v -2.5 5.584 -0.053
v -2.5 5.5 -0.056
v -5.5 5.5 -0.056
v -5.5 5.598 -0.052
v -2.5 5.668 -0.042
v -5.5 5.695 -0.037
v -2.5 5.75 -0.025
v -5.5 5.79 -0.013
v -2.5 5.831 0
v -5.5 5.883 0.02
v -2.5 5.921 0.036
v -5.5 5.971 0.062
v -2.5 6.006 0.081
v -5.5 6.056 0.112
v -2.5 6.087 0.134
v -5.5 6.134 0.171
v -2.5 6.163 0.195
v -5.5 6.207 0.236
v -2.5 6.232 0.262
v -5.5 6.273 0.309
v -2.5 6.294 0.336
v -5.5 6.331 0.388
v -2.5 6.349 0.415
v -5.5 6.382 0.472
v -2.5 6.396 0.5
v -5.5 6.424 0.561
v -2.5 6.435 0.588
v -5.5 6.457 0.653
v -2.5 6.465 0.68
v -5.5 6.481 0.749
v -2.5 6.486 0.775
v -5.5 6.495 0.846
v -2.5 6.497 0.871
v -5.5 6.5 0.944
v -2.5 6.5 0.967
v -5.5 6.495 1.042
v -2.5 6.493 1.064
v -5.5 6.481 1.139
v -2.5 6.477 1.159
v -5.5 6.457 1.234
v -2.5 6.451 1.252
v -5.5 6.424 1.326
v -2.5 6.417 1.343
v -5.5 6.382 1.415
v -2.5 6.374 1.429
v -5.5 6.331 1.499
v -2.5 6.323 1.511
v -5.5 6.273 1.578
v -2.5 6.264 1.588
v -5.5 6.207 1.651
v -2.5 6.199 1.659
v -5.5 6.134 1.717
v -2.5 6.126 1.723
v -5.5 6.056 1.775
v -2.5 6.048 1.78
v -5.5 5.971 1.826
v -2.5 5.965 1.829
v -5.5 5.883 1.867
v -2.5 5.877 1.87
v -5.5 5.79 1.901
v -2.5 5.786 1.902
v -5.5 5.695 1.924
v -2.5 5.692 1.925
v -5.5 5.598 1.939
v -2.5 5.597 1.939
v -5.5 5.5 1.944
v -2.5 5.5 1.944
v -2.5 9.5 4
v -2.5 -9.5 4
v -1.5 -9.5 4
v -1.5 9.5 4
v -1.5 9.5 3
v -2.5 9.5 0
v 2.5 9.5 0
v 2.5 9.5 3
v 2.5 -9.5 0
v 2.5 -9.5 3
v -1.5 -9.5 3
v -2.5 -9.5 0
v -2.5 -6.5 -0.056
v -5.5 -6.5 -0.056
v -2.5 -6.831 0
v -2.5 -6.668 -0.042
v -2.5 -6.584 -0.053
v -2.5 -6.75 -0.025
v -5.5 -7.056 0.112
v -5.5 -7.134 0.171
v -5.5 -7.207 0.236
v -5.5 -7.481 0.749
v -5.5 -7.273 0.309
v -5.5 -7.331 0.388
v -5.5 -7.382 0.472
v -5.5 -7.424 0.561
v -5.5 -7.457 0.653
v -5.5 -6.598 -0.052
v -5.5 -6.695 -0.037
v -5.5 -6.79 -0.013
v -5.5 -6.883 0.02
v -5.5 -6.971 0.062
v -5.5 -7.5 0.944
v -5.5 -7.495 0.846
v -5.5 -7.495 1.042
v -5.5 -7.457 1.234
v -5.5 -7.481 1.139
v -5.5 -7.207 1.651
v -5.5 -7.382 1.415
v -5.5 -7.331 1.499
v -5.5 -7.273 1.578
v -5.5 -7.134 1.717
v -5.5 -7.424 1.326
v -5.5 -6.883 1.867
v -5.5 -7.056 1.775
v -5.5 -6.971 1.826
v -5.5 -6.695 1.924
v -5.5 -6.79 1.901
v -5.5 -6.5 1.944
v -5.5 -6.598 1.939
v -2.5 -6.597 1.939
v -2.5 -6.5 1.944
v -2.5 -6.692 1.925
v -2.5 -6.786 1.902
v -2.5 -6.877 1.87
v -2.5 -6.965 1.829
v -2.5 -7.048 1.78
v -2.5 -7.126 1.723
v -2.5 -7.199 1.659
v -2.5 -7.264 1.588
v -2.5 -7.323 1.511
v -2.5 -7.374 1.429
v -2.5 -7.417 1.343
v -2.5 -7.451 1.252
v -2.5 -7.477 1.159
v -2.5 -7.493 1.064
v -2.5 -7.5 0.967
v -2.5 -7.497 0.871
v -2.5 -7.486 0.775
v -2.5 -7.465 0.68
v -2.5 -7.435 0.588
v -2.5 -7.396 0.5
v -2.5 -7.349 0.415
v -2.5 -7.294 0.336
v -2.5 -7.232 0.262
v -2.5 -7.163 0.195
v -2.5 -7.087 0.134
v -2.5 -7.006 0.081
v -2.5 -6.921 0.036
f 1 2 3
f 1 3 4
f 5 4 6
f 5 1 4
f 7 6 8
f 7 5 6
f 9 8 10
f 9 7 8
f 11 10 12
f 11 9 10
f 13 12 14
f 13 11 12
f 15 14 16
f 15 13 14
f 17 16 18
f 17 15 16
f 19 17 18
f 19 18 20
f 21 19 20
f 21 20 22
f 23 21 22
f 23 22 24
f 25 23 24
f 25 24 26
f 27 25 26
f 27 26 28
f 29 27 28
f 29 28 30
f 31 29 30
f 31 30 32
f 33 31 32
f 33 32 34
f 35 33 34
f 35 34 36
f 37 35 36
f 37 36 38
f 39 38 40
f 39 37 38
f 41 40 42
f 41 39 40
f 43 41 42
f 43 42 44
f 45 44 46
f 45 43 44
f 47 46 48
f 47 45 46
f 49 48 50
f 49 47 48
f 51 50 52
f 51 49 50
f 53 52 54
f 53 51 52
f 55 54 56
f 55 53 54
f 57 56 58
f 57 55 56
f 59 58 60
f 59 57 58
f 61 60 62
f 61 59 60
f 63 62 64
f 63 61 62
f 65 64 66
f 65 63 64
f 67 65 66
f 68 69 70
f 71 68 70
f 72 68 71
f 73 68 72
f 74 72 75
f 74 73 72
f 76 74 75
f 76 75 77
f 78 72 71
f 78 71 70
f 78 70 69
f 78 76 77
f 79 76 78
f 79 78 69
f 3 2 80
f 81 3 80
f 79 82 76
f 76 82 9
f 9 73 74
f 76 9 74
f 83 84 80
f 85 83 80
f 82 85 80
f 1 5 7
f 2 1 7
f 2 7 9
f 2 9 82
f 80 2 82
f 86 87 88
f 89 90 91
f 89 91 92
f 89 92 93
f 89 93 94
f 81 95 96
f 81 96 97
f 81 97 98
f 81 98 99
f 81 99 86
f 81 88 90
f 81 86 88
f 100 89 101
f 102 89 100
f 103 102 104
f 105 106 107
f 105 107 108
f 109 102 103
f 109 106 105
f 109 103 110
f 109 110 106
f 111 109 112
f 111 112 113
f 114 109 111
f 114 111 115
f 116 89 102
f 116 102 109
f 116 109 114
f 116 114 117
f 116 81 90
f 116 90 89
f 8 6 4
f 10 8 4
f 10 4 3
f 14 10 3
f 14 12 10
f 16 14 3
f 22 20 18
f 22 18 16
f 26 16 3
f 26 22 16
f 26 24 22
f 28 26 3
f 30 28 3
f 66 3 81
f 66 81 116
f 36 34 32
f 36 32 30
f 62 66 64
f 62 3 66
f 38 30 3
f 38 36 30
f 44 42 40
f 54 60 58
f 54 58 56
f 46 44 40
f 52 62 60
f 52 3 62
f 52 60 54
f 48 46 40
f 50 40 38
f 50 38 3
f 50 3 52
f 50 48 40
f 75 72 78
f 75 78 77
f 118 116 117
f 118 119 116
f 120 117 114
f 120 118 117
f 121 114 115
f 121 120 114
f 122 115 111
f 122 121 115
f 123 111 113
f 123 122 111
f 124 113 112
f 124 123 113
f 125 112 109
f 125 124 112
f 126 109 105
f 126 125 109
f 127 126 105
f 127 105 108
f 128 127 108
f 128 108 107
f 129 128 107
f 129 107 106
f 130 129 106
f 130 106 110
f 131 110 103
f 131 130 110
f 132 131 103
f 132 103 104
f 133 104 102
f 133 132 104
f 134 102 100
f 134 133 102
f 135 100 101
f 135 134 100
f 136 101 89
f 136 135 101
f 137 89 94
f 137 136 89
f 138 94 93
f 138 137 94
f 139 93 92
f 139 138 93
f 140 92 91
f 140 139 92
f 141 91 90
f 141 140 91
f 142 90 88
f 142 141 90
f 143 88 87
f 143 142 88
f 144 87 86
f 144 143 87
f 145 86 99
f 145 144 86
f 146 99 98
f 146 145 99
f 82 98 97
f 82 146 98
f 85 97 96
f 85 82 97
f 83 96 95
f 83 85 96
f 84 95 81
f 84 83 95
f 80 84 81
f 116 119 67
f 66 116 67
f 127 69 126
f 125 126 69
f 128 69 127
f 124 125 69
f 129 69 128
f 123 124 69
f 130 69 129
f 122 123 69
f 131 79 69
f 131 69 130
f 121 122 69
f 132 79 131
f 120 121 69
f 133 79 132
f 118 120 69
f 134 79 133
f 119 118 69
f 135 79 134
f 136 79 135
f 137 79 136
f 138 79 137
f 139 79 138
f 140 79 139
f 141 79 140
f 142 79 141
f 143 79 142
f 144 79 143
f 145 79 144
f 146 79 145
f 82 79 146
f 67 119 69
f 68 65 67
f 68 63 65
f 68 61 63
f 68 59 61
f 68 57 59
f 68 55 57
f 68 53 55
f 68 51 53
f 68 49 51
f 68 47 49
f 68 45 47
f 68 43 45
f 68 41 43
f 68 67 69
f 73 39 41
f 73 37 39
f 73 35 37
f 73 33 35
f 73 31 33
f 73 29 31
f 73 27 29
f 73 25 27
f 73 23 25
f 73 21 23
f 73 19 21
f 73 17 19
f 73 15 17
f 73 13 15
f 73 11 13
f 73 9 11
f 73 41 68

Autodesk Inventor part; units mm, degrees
ref_plane "YZ Plane" through (0, 0, 0) normal (1, 0, 0) x (0, 1, 0)
ref_plane "XZ Plane" through (0, 0, 0) normal (0, 1, 0) x (-1, 0, 0)
ref_plane "XY Plane" through (0, 0, 0) normal (0, 0, 1) x (1, 0, 0)
sketch "草图1" plane through (0, 0, 0) normal (0, 0, 1) x (1, 0, 0)
  line L0 (2.5, -9.5) -> (-2.5, -9.5)
  line L1 (-2.5, -9.5) -> (-2.5, 9.5)
  line L2 (-2.5, 9.5) -> (2.5, 9.5)
  line L3 (2.5, 9.5) -> (2.5, -9.5)
  line L4 (2.5, -9.5) -> (-2.5, 9.5) construction
  line L5 (-2.5, -9.5) -> (2.5, 9.5) construction
  point P0 (0, 0)
  dimension "d0" = 5
  dimension "d1" = 19
extrude "拉伸1" add sketch "草图1" along normal blind 3
sketch "草图2" plane through (0, 0, 3) normal (0, 0, 1) x (1, 0, 0)
  line L0 (2.5, 9.5) -> (-2.5, 9.5) projected
  line L1 (-2.5, -9.5) -> (2.5, -9.5) projected
  line L2 (-2.5, 9.5) -> (-1.5, 9.5)
  line L3 (-1.5, 9.5) -> (-1.5, -9.5)
  line L4 (-1.5, -9.5) -> (-2.5, -9.5)
  line L5 (-2.5, -9.5) -> (-2.5, 9.5)
  point P0 (0, 0)
  dimension "d4" = 1
extrude "拉伸2" add sketch "草图2" along normal blind 1
sketch "草图3" plane through (-2.5, -9.5, 0) normal (-1, 0, 0) x (0, 0, 1)
  line L0 (0.9436, 15) -> (0.9436, 3) construction
  line L1 (-0.0564, 15) -> (-0.0564, 3)
  line L2 (1.9436, 3) -> (1.9436, 15)
  arc A0 (1.9436, 15) -> (-0.0564, 15) centre (0.9436, 15) ccw
  arc A1 (-0.0564, 3) -> (1.9436, 3) centre (0.9436, 3) ccw
  line L3 (0, 19) -> (4, 19) projected
  point P0 (0, 9.5)
  point P1 (0.9436, 9)
  point P2 (0.9436, 16)
  point P3 (0.9436, 2)
  dimension "d7" = 2
  dimension "d8" = 14
  dimension "d9" = 3
extrude "拉伸3" add sketch "草图3" along normal blind 3
properties part number "指纹识别"
